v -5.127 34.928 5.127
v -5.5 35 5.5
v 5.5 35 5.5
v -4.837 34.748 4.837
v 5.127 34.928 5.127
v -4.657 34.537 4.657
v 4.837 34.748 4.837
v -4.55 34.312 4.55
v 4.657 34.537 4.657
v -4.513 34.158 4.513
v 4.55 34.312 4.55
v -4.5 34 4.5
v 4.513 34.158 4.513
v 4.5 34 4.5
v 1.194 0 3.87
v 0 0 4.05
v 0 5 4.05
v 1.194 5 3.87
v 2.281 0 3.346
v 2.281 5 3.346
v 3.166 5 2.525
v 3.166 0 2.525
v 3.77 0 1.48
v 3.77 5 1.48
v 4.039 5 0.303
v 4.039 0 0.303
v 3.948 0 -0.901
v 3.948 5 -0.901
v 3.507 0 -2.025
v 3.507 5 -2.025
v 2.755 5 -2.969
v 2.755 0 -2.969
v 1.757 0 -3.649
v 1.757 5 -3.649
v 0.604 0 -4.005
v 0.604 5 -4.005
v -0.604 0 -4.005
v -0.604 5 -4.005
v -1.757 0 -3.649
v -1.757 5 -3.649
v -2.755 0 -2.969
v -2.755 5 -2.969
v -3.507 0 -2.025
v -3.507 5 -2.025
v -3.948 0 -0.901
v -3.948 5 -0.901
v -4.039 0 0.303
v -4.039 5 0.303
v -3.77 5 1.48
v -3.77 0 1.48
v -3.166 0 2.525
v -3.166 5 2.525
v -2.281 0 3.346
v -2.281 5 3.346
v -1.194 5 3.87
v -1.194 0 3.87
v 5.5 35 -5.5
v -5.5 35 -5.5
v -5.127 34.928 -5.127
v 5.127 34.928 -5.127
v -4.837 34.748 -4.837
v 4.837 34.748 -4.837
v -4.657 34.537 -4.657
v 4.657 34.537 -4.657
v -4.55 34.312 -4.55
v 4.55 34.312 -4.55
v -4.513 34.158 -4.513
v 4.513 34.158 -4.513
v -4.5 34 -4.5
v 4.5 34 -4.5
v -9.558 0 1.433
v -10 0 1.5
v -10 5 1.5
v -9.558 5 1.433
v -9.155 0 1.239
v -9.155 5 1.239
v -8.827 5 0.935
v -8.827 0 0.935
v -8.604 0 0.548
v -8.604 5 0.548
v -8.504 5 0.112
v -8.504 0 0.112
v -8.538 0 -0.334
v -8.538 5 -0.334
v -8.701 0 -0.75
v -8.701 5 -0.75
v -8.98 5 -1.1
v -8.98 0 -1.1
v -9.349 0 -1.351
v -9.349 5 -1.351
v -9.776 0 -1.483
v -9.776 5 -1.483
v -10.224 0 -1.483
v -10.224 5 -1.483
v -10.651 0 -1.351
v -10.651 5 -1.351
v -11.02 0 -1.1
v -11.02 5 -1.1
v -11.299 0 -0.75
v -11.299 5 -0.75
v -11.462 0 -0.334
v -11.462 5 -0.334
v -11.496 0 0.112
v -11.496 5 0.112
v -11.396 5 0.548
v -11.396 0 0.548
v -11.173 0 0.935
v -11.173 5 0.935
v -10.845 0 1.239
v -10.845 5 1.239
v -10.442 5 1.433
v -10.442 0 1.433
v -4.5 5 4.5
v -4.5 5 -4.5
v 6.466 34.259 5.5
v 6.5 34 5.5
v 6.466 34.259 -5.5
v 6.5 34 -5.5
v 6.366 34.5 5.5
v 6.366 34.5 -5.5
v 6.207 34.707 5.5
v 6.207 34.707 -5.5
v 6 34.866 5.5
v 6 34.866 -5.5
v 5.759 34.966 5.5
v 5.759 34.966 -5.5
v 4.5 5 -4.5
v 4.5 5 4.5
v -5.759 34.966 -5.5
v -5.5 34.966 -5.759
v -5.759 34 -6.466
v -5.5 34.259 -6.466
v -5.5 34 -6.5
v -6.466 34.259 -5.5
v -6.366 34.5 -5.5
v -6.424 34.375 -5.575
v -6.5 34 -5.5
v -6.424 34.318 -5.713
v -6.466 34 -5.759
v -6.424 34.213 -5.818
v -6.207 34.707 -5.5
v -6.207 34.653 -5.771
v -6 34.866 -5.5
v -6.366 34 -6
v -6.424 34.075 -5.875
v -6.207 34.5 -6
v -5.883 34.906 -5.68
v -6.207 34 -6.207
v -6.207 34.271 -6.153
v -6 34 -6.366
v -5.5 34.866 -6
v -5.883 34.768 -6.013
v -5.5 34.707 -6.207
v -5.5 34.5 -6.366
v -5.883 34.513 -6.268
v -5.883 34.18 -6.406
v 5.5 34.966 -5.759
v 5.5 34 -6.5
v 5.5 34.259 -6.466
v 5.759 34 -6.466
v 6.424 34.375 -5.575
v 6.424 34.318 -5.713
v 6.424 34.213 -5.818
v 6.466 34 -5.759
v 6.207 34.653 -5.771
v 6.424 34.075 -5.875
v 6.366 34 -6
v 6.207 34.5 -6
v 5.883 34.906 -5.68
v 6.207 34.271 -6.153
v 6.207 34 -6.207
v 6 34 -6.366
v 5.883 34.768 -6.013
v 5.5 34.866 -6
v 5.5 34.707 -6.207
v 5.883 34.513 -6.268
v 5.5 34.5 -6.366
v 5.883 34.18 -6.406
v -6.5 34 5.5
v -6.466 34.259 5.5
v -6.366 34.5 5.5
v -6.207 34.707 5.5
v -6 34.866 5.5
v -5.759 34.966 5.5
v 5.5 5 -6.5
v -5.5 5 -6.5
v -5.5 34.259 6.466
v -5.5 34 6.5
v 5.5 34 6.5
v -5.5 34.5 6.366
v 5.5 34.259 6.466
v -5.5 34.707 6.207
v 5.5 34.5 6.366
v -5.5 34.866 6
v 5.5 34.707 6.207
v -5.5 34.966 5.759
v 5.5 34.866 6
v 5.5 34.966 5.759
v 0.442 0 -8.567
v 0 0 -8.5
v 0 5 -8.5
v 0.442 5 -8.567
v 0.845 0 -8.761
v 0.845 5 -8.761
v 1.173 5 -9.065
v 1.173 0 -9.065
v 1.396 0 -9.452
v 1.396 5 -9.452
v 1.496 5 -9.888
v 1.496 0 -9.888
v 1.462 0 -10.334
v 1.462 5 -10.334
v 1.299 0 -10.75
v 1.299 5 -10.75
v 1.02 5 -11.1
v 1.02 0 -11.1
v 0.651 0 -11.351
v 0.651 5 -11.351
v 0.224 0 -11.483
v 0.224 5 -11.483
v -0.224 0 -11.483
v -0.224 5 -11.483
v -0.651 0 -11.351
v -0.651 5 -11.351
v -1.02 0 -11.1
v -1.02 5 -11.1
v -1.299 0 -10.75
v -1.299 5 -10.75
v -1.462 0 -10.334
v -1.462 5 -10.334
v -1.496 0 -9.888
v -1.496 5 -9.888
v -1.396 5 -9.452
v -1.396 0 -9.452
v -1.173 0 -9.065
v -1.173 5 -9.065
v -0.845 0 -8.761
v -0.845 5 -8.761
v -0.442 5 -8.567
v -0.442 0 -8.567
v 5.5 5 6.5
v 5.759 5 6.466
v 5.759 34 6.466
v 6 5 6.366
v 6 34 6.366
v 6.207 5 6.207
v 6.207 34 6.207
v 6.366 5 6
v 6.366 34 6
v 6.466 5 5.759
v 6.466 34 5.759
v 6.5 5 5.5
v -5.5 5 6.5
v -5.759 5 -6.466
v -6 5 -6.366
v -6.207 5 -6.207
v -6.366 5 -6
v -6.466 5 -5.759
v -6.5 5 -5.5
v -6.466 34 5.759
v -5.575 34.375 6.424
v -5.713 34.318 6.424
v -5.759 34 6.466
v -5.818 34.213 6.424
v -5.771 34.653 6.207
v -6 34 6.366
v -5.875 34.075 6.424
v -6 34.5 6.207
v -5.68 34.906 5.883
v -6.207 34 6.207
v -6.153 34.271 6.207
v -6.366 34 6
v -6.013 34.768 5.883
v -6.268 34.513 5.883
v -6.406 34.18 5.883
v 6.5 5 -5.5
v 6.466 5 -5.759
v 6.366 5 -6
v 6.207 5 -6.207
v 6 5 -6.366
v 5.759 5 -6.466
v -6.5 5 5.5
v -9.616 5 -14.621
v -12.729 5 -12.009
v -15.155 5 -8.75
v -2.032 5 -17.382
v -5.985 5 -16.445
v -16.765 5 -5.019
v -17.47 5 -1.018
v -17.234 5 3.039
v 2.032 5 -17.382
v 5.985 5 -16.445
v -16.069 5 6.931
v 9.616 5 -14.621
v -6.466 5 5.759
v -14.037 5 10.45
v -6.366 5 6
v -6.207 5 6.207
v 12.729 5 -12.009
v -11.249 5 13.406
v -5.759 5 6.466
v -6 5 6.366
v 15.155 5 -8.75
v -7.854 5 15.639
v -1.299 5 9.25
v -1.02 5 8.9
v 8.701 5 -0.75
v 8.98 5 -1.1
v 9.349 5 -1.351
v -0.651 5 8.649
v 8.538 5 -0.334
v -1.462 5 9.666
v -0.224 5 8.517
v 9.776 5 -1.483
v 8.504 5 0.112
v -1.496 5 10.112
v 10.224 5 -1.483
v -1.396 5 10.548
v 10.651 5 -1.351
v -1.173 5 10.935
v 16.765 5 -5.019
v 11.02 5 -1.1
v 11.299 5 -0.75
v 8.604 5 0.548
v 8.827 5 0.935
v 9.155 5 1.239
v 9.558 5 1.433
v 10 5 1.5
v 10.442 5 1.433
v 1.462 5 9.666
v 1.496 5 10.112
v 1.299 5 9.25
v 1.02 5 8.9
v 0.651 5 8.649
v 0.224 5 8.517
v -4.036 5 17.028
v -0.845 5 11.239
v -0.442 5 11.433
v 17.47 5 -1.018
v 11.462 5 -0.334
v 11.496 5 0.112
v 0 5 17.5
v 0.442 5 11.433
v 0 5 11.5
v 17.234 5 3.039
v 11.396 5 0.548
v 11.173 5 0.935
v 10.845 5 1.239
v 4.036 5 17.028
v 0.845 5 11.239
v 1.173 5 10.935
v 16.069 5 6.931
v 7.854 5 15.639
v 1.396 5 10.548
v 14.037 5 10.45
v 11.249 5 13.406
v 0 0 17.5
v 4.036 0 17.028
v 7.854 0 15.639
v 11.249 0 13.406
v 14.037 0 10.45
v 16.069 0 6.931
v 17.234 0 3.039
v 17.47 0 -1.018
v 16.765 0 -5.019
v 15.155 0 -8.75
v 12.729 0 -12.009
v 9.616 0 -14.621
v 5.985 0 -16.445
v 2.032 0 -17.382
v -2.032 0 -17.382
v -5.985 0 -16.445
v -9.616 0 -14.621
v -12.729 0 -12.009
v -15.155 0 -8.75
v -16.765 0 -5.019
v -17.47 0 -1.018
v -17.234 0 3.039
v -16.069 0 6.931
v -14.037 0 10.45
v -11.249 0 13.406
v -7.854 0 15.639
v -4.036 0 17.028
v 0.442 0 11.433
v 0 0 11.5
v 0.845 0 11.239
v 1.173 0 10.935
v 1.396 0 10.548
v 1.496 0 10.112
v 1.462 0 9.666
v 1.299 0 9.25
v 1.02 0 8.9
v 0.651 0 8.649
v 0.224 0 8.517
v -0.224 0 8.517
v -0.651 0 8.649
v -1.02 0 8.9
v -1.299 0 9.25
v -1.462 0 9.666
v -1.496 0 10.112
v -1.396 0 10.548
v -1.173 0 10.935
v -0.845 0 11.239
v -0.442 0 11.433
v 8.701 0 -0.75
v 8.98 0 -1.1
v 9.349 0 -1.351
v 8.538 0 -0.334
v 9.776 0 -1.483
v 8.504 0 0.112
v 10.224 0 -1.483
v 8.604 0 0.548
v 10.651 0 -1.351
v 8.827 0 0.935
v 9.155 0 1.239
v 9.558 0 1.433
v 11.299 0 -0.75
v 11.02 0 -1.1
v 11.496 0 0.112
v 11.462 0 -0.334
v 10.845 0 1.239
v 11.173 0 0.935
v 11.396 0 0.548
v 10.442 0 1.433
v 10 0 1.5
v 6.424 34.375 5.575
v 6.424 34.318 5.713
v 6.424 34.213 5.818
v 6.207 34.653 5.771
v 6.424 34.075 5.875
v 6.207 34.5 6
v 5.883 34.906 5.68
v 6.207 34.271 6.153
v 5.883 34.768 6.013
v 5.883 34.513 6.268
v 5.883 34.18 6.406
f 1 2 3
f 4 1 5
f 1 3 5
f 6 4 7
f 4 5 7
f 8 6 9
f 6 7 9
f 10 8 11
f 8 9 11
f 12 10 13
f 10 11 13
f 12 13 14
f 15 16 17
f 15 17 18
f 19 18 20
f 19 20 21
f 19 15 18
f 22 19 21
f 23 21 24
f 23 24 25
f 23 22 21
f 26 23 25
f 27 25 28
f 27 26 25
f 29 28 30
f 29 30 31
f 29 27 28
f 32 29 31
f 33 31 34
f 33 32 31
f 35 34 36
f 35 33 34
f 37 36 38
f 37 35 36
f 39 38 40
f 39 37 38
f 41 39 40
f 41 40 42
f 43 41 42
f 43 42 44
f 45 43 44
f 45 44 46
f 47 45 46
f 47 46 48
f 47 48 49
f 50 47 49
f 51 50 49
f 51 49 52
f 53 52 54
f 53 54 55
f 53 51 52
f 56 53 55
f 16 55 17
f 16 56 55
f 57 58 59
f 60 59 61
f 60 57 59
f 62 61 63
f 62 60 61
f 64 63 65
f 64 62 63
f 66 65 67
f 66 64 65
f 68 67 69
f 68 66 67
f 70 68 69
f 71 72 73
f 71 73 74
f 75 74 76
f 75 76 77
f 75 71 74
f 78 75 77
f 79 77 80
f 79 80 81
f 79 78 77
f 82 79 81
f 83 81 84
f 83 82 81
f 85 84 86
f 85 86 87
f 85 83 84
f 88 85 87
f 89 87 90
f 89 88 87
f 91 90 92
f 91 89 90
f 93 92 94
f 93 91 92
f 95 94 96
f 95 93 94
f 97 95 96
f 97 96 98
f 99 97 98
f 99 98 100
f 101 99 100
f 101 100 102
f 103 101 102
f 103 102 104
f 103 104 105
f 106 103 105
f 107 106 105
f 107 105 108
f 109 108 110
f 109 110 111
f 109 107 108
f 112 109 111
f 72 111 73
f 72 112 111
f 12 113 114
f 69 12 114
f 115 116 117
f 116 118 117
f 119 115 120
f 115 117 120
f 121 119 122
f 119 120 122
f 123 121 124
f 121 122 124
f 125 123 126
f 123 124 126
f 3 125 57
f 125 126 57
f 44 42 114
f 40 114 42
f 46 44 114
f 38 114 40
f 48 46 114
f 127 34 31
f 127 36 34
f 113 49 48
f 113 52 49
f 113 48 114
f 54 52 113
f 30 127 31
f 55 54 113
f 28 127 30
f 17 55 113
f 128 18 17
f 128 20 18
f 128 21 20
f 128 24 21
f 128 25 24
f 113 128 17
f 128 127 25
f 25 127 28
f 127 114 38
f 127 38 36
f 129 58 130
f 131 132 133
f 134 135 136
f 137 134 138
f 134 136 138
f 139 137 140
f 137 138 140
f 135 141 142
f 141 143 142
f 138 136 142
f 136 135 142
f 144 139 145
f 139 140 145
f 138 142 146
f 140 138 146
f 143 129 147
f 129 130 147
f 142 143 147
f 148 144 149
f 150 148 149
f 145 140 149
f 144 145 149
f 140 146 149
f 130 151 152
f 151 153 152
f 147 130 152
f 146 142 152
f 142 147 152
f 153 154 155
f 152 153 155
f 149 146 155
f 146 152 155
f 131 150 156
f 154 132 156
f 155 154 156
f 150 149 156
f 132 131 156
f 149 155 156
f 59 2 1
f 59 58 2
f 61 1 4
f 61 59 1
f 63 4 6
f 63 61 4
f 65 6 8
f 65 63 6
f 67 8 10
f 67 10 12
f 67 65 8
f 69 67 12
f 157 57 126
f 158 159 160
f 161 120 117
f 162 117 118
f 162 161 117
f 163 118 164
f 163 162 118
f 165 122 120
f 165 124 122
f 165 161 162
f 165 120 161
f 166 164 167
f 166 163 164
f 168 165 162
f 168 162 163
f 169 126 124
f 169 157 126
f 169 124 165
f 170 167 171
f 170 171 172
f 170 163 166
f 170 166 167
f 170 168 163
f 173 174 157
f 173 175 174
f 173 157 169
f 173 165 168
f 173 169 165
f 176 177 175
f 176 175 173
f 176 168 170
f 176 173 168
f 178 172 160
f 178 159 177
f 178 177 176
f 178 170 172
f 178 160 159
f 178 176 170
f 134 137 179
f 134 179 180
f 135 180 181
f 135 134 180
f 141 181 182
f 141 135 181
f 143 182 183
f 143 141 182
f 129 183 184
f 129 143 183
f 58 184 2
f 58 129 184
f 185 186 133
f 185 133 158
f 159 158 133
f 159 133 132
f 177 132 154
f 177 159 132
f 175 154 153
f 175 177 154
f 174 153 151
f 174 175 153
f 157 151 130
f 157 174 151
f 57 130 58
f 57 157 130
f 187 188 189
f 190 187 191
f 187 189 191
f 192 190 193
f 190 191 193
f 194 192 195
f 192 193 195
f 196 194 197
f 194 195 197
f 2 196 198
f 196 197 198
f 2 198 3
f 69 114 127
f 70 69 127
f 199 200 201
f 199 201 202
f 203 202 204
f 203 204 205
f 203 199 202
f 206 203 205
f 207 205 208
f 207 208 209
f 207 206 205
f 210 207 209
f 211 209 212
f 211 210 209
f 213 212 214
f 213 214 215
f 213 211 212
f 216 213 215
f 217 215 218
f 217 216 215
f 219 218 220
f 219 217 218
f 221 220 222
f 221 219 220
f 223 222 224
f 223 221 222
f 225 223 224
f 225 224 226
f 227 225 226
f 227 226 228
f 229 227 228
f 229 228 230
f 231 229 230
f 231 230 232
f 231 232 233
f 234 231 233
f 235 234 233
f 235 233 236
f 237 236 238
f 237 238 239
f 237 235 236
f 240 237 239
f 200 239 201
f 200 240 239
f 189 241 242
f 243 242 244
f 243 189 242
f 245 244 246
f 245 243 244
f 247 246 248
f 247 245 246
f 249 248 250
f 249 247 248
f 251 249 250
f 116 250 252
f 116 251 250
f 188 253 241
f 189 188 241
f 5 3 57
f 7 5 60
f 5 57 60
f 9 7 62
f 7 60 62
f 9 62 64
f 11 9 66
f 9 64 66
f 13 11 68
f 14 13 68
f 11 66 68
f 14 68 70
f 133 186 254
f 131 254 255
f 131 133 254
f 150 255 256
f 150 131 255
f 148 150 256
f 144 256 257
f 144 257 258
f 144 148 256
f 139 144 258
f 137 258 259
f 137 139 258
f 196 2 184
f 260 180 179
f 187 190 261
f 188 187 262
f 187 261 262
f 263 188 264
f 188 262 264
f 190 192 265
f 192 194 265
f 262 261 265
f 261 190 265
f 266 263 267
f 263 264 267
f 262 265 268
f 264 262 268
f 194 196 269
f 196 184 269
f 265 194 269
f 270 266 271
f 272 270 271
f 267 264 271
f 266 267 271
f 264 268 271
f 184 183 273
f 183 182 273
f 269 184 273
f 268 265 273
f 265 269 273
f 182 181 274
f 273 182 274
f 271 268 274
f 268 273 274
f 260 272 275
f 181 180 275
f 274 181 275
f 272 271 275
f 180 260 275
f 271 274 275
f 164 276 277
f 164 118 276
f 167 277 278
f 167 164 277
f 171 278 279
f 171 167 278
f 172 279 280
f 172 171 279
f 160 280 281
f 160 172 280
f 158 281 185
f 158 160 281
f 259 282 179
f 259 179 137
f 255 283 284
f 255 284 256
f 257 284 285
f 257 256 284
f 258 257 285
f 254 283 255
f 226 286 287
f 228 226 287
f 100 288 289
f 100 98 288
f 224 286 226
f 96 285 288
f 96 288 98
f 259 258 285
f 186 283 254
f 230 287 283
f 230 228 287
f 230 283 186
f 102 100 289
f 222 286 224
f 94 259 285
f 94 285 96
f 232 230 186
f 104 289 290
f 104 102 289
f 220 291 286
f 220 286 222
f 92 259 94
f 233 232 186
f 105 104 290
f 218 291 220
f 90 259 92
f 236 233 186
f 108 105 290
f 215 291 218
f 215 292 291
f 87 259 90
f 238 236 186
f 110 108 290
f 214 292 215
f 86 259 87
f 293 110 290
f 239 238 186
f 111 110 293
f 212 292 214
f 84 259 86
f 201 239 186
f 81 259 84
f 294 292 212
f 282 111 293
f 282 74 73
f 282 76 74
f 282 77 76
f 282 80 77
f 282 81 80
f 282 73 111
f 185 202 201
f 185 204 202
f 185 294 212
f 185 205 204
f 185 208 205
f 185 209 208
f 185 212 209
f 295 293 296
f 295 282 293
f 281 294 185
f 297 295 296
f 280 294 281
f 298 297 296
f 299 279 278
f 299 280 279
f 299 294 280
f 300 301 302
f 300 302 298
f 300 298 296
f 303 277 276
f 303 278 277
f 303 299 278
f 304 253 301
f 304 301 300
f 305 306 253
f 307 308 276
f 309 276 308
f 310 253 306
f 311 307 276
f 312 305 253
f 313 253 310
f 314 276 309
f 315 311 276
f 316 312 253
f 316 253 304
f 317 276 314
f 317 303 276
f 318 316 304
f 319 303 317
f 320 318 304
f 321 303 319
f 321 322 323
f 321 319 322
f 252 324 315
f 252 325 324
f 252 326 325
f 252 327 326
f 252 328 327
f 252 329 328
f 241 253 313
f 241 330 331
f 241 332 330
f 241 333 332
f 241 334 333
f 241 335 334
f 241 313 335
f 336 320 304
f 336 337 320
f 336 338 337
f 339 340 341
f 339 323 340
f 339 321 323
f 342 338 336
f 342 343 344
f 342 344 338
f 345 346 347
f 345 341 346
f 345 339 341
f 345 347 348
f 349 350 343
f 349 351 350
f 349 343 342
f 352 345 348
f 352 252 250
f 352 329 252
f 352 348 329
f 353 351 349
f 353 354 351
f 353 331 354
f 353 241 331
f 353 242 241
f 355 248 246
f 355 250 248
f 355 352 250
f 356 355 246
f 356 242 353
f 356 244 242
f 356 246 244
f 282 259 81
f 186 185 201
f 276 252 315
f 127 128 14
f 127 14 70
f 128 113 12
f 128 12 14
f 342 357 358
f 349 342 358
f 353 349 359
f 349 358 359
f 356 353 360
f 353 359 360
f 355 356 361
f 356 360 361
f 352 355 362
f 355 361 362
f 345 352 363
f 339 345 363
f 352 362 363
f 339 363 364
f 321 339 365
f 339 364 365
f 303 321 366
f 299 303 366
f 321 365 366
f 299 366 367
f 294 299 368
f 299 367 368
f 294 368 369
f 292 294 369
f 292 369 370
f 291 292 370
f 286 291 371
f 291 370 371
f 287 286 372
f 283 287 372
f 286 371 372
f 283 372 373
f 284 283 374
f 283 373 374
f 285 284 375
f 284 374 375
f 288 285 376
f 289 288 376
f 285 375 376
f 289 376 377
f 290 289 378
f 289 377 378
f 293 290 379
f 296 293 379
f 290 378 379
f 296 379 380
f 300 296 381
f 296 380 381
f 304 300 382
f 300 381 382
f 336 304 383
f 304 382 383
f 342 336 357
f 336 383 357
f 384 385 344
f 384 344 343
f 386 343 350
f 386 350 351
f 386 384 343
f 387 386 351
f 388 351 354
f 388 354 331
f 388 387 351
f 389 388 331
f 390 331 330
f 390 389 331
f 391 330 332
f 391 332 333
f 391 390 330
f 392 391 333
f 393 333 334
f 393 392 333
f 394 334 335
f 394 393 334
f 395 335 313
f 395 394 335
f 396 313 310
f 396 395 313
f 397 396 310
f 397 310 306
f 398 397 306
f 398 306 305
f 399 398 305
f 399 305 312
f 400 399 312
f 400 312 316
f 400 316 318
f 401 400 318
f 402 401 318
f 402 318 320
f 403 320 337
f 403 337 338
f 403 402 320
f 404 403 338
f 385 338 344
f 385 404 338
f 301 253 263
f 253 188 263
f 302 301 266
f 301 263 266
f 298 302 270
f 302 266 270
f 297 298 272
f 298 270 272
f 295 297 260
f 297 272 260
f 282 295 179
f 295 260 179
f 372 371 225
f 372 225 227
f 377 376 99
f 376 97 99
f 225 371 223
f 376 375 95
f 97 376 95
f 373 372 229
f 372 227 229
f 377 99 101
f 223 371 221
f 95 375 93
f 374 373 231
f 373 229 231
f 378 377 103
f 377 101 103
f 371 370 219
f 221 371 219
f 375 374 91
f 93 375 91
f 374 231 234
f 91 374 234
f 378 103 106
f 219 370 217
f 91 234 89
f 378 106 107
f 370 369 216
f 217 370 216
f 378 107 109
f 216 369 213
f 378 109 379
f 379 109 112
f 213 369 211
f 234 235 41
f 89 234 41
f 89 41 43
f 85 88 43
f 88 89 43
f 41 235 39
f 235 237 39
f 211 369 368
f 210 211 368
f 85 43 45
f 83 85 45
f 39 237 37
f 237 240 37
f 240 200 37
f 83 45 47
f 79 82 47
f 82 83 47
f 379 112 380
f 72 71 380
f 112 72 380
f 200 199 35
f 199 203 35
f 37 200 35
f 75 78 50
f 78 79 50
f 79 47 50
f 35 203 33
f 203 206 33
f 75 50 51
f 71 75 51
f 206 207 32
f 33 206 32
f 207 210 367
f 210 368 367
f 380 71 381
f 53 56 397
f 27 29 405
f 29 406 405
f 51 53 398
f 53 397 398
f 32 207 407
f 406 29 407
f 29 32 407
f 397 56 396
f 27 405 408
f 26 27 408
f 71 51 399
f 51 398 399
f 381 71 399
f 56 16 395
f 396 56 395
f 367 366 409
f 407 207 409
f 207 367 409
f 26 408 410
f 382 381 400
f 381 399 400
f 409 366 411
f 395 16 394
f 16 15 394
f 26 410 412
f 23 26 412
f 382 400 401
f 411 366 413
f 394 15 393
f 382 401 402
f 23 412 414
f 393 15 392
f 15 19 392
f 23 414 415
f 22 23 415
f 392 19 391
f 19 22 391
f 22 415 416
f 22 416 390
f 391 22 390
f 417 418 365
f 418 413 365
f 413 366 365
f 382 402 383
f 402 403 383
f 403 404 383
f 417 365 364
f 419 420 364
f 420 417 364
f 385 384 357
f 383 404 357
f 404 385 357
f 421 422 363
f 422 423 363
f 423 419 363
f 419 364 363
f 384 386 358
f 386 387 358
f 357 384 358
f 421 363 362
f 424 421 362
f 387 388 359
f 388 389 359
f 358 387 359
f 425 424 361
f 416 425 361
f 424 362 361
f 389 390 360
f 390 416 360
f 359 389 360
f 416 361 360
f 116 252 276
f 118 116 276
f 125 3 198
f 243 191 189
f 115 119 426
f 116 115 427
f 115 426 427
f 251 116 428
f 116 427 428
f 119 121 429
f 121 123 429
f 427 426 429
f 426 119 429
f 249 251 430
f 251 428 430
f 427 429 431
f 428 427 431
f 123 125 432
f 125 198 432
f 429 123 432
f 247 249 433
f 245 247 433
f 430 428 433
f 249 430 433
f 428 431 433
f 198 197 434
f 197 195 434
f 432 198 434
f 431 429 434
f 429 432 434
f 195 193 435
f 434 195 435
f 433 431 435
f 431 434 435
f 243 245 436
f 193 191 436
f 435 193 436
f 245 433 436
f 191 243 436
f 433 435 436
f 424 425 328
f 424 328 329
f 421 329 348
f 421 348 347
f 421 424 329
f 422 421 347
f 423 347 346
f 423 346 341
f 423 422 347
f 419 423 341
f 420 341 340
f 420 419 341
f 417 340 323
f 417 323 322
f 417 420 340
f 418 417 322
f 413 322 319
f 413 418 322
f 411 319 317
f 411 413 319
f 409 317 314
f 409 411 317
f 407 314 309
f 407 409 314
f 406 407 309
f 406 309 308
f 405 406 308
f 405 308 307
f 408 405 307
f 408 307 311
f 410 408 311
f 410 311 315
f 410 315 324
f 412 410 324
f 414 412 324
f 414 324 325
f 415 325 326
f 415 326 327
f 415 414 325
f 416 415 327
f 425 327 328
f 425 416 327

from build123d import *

# Parameters (mm, degrees)
SKETCH_1_R      = 17.5
SKETCH_1_R_2    = 4.05
SKETCH_1_R_3    = 1.5
EXTRUDE_1_DEPTH = 5
SKETCH_2_W      = 13
SKETCH_2_H      = 13
SKETCH_2_W_2    = 9
SKETCH_2_H_2    = 9
EXTRUDE_2_DEPTH = 30
FILLET_1_R      = 1


with BuildPart() as part:
    # 草图1 → 凸台-拉伸1 (new body)
    with BuildSketch(Plane(origin=(0, 0, 0), x_dir=(1, 0, 0), z_dir=(0, 1, 0))):
        with Locations(Location((0, 0, 0), (0, 0, 270))):
            Circle(SKETCH_1_R)
        with Locations(Location((0, 0, 0), (0, 0, 270))):
            Circle(SKETCH_1_R_2, mode=Mode.SUBTRACT)
        with Locations(Location((0, 10, 0), (0, 0, 270))):
            Circle(SKETCH_1_R_3, mode=Mode.SUBTRACT)
        with Locations(Location((10, 0, 0), (0, 0, 270))):
            Circle(SKETCH_1_R_3, mode=Mode.SUBTRACT)
        with Locations(Location((0, -10, 0), (0, 0, 270))):
            Circle(SKETCH_1_R_3, mode=Mode.SUBTRACT)
        with Locations(Location((-10, 0, 0), (0, 0, 270))):
            Circle(SKETCH_1_R_3, mode=Mode.SUBTRACT)
    extrude(amount=EXTRUDE_1_DEPTH)

    # 草图2 → 凸台-拉伸2 (add)
    with BuildSketch(Plane(origin=(0, 5, 0), x_dir=(1, 0, 0), z_dir=(0, 1, 0))):
        Rectangle(SKETCH_2_W, SKETCH_2_H)
        Rectangle(SKETCH_2_W_2, SKETCH_2_H_2, mode=Mode.SUBTRACT)
    extrude(amount=EXTRUDE_2_DEPTH)

    # 圆角1
    fillet_1_edges = [part.edges().sort_by_distance(p)[0] for p in [
        (0, 35, -6.5),
        (-6.5, 35, 0),
        (0, 35, 6.5),
        (6.5, 35, 0),
        (6.5, 20, -6.5),
        (-6.5, 20, -6.5),
        (-6.5, 20, 6.5),
        (6.5, 20, 6.5),
        (-4.5, 35, 0),
        (0, 35, 4.5),
        (4.5, 35, 0),
        (0, 35, -4.5),
    ]]
    fillet(fillet_1_edges, radius=FILLET_1_R - 0.0001)  # a hair under: the kernel refuses the full size


solid = part.part
